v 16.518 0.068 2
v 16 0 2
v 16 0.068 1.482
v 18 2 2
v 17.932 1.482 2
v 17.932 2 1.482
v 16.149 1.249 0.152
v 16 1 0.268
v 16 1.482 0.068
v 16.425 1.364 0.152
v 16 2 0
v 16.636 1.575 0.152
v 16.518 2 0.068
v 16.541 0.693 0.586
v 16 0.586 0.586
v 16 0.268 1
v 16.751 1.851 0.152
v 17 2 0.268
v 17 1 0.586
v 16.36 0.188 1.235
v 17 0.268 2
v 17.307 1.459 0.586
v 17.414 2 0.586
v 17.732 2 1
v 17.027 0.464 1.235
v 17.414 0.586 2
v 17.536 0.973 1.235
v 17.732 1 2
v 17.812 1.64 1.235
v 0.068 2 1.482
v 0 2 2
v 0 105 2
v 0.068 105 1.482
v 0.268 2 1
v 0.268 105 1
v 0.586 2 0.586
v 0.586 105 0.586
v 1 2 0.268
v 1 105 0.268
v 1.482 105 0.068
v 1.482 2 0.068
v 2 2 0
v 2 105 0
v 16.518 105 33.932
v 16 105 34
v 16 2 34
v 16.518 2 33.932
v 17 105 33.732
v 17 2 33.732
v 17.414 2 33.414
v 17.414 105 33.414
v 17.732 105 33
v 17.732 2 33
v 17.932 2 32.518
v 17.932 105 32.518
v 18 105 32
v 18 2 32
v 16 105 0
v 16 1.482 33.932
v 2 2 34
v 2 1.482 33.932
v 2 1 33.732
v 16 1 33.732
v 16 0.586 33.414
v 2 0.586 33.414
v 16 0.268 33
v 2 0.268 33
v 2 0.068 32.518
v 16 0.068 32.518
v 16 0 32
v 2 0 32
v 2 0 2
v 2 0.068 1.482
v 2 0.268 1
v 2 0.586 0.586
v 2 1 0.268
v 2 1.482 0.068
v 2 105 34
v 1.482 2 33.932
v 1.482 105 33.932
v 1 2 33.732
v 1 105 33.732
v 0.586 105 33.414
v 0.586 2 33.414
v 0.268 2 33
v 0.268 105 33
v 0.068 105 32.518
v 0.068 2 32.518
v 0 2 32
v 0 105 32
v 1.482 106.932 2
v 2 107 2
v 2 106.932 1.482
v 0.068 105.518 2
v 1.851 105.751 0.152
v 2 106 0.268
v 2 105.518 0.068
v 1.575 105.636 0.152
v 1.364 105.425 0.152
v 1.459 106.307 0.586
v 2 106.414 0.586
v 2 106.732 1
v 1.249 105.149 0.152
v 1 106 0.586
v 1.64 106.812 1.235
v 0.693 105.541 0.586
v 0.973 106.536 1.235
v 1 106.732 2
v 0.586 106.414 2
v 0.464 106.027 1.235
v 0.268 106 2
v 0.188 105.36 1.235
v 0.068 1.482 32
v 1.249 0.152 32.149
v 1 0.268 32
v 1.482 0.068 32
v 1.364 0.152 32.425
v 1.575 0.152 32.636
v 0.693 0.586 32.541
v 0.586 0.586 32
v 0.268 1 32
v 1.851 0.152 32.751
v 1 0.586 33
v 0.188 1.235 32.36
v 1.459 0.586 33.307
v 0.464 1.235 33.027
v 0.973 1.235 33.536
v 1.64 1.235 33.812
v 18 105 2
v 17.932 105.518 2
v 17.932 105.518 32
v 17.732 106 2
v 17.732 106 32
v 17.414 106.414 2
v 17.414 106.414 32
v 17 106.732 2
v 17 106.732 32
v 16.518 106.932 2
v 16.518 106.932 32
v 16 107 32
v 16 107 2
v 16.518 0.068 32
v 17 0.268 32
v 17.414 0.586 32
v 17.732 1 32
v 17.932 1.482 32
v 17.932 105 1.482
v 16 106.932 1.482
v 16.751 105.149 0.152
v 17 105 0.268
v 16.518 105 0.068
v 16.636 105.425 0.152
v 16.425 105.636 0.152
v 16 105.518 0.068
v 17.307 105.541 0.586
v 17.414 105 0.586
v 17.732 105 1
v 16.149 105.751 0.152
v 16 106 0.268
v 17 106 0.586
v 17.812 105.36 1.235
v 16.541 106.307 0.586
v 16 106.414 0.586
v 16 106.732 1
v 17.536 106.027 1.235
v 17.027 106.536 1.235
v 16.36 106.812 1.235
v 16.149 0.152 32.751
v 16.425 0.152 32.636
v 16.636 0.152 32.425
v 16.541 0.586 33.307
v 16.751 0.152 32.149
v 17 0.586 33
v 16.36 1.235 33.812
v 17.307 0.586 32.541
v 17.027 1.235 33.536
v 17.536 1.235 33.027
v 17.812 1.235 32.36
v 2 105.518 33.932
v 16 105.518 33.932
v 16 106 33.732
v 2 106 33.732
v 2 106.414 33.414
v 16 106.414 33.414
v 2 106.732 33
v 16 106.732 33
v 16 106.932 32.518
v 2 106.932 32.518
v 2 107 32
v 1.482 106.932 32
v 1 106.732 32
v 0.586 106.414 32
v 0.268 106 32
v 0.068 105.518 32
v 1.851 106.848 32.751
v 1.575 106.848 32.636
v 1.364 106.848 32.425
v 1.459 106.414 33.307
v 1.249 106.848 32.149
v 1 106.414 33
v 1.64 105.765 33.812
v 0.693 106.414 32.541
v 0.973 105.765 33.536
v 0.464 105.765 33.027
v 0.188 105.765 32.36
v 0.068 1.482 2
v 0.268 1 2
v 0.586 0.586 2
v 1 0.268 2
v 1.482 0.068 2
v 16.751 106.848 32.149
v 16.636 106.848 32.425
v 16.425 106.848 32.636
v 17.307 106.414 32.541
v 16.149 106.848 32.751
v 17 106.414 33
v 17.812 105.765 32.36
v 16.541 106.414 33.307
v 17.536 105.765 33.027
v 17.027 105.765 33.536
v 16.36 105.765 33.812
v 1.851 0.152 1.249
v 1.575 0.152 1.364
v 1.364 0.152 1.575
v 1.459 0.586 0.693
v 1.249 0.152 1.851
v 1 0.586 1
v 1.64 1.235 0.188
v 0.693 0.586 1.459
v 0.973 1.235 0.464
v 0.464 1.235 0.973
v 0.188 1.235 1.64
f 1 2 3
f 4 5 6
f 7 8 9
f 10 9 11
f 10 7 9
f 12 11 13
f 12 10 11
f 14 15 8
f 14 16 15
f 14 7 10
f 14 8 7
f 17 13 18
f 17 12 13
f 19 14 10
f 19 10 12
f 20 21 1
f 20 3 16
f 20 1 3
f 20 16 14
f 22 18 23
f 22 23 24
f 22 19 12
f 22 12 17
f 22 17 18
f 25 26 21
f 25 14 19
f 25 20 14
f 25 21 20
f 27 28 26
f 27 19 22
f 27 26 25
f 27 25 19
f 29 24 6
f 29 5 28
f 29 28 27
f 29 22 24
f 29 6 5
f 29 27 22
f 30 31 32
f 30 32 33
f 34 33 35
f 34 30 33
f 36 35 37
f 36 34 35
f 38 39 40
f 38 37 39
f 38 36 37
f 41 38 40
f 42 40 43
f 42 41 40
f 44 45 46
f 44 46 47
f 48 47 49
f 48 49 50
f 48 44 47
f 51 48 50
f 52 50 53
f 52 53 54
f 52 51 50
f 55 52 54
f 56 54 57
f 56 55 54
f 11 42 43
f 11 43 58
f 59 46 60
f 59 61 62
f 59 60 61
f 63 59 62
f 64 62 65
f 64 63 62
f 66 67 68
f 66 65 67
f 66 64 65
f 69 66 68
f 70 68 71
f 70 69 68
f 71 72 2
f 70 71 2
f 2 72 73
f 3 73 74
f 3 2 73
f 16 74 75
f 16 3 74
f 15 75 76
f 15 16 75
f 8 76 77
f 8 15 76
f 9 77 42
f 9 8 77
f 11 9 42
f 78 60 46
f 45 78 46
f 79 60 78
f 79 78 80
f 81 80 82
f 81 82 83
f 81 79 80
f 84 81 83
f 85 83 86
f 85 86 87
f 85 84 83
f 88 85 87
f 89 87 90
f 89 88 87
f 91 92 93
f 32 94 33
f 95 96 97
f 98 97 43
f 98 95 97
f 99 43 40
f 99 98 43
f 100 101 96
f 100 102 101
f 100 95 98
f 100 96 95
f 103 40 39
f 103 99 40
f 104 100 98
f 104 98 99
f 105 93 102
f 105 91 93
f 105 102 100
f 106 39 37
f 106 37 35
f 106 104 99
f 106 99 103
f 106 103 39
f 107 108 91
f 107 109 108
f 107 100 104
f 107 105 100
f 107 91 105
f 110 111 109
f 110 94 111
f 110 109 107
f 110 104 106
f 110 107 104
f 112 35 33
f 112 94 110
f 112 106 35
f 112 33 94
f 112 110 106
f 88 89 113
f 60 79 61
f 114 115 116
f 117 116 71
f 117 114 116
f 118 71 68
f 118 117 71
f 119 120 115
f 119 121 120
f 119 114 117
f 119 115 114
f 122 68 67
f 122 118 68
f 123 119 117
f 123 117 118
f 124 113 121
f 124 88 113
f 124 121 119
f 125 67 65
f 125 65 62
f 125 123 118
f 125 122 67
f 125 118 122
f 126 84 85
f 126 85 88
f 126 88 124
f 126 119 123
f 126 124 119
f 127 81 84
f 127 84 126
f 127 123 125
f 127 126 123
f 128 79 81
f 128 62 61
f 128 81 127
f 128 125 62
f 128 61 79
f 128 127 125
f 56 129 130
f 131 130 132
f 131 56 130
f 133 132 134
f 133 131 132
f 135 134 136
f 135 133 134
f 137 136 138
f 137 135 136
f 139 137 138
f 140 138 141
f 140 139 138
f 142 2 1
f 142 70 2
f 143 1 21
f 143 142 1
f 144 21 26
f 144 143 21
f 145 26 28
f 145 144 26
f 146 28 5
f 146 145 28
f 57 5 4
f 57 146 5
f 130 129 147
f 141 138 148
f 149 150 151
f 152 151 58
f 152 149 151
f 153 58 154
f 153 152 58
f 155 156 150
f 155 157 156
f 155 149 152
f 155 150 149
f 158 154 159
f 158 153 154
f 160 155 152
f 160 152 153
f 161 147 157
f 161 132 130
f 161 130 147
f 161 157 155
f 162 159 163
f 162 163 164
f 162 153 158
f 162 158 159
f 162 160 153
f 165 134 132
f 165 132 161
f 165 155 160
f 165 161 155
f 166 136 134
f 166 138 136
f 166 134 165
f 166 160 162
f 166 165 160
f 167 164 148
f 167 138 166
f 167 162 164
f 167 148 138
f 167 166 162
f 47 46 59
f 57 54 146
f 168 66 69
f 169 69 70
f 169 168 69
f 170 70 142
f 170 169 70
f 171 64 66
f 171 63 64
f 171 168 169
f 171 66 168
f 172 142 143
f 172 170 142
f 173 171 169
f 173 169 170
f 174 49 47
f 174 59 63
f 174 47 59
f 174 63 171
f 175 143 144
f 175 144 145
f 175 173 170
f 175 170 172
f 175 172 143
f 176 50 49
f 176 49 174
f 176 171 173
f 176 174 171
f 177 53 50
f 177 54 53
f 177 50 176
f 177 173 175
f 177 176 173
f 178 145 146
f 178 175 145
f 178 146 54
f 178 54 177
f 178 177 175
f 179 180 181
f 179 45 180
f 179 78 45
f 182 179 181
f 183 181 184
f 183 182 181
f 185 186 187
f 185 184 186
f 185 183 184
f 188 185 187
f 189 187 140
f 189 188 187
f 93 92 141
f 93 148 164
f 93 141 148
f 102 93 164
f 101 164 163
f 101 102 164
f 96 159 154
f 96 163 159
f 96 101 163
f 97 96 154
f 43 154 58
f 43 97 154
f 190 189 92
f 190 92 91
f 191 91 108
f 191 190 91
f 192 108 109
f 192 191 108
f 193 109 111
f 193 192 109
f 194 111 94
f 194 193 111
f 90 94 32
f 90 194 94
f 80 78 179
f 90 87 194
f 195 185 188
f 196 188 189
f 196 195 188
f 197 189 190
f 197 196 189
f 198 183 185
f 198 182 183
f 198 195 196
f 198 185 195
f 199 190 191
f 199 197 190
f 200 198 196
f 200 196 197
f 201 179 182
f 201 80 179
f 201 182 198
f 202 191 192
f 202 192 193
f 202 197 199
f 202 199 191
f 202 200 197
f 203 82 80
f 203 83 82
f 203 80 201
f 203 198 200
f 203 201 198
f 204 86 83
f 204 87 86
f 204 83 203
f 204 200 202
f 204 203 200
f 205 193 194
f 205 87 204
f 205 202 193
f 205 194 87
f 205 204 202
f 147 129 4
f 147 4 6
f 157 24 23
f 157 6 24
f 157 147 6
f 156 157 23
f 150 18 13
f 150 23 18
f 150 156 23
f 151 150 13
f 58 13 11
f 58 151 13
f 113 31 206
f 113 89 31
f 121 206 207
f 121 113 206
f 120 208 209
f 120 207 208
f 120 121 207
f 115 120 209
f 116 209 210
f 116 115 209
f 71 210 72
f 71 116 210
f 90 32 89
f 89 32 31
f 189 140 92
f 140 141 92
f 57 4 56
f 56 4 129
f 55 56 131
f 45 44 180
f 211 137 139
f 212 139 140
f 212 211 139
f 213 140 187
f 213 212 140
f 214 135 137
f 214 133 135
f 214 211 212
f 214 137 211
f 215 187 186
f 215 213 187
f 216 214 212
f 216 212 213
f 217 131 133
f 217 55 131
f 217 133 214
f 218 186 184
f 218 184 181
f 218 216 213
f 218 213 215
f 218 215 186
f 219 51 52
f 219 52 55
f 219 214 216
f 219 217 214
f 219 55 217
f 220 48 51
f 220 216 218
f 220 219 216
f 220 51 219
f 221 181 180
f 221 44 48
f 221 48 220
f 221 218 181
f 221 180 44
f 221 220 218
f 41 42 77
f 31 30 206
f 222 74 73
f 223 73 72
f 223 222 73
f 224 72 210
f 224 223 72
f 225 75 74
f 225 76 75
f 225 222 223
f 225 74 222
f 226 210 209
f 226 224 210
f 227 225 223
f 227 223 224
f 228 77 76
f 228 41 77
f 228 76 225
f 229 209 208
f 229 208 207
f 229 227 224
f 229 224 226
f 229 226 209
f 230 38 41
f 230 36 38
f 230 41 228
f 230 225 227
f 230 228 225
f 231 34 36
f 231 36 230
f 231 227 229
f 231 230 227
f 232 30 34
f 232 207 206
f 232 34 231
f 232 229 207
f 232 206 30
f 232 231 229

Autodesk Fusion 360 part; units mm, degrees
sketch "スケッチ1" plane through (0, 0, 0) normal (0, 0, 1) x (1, 0, 0)
  line L0 (0, 0) -> (18, 0)
  line L1 (18, 0) -> (18, 107)
  line L2 (18, 107) -> (0, 107)
  line L3 (0, 107) -> (0, 0)
  dimension "d1" = 18
  dimension "d2" = 107
extrude "押し出し1" add sketch "スケッチ1" along normal blind 34
fillet "フィレット1" radius 2 12 edges at (0, 53.5, 34) (18, 53.5, 34) (9, 107, 34) (9, 0, 34) (18, 0, 17) (18, 107, 17) (18, 53.5, 0) (0, 107, 17) (9, 107, 0) (0, 53.5, 0) (9, 0, 0) (0, 0, 17)
